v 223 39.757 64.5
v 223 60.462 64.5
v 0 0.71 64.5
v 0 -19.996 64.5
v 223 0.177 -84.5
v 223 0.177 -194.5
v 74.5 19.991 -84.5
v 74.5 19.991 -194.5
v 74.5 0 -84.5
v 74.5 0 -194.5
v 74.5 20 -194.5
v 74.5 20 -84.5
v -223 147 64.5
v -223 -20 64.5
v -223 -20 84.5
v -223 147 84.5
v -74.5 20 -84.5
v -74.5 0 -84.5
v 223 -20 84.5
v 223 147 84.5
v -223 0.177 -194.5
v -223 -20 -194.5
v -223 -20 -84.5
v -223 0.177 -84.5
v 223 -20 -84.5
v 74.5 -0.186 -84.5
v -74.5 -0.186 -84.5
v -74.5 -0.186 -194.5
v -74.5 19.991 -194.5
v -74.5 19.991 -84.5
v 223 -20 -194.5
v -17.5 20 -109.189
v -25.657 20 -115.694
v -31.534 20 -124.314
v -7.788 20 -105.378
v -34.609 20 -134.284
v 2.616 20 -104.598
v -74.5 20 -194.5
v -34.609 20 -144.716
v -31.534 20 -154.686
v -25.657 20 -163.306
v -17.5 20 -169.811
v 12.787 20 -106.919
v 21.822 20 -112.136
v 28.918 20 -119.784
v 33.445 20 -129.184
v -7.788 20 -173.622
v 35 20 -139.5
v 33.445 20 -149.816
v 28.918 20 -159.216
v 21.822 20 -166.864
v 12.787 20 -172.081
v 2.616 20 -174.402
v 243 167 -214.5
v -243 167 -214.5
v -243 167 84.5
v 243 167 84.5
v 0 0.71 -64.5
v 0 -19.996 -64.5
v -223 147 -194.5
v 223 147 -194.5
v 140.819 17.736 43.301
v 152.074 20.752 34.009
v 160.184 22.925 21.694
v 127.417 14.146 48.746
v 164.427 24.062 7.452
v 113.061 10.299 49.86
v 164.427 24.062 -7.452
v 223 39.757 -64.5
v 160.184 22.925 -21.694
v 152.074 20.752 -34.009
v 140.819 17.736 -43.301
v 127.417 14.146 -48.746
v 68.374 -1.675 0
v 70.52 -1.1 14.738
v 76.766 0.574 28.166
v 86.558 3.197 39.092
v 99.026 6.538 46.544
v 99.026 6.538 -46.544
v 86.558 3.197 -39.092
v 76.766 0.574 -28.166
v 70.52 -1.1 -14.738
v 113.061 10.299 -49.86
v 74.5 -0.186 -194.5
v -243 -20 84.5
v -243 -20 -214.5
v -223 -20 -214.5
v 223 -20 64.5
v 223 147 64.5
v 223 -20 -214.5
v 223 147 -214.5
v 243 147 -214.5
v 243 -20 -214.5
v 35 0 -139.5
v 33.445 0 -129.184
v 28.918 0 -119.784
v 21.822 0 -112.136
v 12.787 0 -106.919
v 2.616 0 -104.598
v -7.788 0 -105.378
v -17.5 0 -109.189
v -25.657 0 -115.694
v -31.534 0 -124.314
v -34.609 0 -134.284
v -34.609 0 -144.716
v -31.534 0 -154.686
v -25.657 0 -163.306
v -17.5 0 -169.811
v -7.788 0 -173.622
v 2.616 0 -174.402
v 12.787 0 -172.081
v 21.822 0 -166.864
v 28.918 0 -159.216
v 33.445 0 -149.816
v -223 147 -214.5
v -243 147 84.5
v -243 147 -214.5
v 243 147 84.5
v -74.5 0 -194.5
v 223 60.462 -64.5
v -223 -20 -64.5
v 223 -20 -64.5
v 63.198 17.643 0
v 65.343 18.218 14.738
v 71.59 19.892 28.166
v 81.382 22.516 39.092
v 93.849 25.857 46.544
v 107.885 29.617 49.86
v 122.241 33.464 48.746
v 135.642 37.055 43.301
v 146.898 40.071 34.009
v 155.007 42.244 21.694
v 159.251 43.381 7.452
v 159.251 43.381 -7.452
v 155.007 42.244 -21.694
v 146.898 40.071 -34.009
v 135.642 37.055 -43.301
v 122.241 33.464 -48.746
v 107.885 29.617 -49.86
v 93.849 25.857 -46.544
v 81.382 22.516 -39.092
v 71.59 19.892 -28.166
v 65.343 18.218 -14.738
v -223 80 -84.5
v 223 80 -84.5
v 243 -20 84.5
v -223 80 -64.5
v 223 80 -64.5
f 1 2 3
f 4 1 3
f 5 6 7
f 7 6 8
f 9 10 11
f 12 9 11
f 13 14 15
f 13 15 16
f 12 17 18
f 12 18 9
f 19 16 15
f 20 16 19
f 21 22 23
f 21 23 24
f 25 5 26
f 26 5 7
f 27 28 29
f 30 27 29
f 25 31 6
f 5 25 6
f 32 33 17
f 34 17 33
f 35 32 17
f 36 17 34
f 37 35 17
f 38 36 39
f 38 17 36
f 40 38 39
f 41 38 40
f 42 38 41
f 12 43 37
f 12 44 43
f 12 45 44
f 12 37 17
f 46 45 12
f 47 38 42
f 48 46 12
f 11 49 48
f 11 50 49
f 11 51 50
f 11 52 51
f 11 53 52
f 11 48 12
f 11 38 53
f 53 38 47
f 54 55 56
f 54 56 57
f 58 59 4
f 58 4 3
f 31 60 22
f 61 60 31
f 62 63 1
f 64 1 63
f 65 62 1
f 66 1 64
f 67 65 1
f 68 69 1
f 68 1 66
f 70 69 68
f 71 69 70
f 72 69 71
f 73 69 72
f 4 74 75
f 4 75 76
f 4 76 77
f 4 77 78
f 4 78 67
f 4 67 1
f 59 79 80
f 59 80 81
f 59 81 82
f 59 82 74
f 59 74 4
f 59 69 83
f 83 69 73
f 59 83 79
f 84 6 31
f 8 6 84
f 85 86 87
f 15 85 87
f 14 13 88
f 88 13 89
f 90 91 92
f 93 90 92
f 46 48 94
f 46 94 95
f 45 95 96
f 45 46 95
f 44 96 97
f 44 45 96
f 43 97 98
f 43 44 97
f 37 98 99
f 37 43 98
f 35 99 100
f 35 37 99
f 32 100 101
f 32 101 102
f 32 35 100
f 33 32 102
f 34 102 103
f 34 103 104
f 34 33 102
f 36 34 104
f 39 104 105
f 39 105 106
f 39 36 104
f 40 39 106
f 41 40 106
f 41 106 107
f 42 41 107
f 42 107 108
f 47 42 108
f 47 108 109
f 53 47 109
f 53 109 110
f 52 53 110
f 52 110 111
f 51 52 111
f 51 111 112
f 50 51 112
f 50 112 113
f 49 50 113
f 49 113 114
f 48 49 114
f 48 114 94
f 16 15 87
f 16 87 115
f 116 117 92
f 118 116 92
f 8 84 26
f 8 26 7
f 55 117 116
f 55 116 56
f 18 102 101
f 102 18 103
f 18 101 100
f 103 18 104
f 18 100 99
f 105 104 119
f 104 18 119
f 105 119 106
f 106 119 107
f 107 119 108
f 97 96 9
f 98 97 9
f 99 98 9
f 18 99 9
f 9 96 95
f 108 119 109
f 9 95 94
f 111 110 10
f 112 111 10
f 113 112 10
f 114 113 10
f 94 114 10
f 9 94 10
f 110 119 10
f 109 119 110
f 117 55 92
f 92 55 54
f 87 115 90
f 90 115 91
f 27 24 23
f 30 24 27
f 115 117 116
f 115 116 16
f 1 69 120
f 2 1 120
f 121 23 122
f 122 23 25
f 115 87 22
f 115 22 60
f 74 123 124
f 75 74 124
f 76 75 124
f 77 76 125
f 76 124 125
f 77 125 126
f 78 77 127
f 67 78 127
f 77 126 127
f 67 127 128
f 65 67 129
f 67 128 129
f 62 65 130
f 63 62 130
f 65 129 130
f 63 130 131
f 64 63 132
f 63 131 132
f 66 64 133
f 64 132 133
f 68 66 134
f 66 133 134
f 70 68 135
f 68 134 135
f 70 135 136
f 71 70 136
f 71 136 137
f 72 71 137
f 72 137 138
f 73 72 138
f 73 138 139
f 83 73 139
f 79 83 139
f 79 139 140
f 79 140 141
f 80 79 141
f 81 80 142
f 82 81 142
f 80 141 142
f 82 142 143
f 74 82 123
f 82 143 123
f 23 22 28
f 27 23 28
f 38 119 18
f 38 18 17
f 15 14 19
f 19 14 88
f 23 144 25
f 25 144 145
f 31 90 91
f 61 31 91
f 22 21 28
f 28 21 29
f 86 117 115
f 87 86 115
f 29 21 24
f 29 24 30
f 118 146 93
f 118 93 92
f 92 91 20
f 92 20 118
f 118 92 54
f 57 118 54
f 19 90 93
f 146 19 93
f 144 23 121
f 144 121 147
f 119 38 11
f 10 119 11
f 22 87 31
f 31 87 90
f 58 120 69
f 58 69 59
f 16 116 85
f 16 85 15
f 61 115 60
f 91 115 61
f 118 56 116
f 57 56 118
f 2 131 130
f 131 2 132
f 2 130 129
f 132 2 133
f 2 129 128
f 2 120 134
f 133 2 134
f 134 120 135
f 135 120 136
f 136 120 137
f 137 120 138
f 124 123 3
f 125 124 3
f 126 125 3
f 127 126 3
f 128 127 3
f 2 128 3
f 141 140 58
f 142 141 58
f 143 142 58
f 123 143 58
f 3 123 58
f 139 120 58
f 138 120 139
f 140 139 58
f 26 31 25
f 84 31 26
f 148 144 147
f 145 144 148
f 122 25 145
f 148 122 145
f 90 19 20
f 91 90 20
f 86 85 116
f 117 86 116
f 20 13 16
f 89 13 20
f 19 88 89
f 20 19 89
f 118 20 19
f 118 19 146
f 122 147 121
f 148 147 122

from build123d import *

# Parameters (mm, degrees)
BOX_W                  = 20
BOX_H                  = 167
BOX_DEPTH              = 299
BOX001_W               = 20
BOX001_H               = 167
BOX001_DEPTH           = 299
BOX002_W               = 446
BOX002_H               = 167
BOX002_DEPTH           = 20
BOX003_W               = 486
BOX003_H               = 20
BOX003_DEPTH           = 299
BOX004_W               = 446
BOX004_H               = 167
BOX004_DEPTH           = 20
BOX006_W               = 446
BOX006_H               = 100
BOX006_DEPTH           = 20
CYLINDER_R             = 35
CYLINDER_DEPTH         = 115
CYLINDER_ROLL_ANGLE    = 90
BOX005_W               = 149
BOX005_H               = 20
BOX005_DEPTH           = 110
BOX008_W               = 10
BOX008_H               = 23
BOX008_DEPTH           = 110
BOX009_W               = 20
BOX009_H               = 21
BOX009_DEPTH           = 110
BOX007_W               = 153
BOX007_H               = 20
BOX007_DEPTH           = 110
BOX007_PLACEMENT_ANGLE = 7.6
BOX012_W               = 10
BOX012_H               = 23
BOX012_DEPTH           = 110
BOX011_W               = 20
BOX011_H               = 21
BOX011_DEPTH           = 110
BOX010_W               = 153
BOX010_H               = 20
BOX010_DEPTH           = 110
BOX010_PLACEMENT_ANGLE = 7.6
BOX016_W               = 7
BOX016_H               = 23
BOX016_DEPTH           = 129
BOX014_W               = 10
BOX014_H               = 30
BOX014_DEPTH           = 129
CYLINDER001_R          = 50
CYLINDER001_DEPTH      = 20
CYLINDER001_ROLL_ANGLE = 90
BOX017_W               = 237
BOX017_H               = 20
BOX017_DEPTH           = 129
CUT005_PLACEMENT_ANGLE = -15


with BuildPart() as face_gauche:
    # Box → Box (new body)
    with BuildSketch(Plane(origin=(-243, -20, -214.5), x_dir=(1, 0, 0), z_dir=(0, 0, 1))):
        with Locations((10, 83.5)):
            Rectangle(BOX_W, BOX_H)
    extrude(amount=BOX_DEPTH)


with BuildPart() as face_droite:
    # Box001 → Box001 (new body)
    with BuildSketch(Plane(origin=(223, -20, -214.5), x_dir=(1, 0, 0), z_dir=(0, 0, 1))):
        with Locations((10, 83.5)):
            Rectangle(BOX001_W, BOX001_H)
    extrude(amount=BOX001_DEPTH)


with BuildPart() as face_haute:
    # Box002 → Box002 (new body)
    with BuildSketch(Plane(origin=(-223, -20, 64.5), x_dir=(1, 0, 0), z_dir=(0, 0, 1))):
        with Locations((223, 83.5)):
            Rectangle(BOX002_W, BOX002_H)
    extrude(amount=BOX002_DEPTH)


with BuildPart() as face_fond:
    # Box003 → Box003 (new body)
    with BuildSketch(Plane(origin=(-243, 147, -214.5), x_dir=(1, 0, 0), z_dir=(0, 0, 1))):
        with Locations((243, 10)):
            Rectangle(BOX003_W, BOX003_H)
    extrude(amount=BOX003_DEPTH)


with BuildPart() as face_basse:
    # Box004 → Box004 (new body)
    with BuildSketch(Plane(origin=(-223, -20, -214.5), x_dir=(1, 0, 0), z_dir=(0, 0, 1))):
        with Locations((223, 83.5)):
            Rectangle(BOX004_W, BOX004_H)
    extrude(amount=BOX004_DEPTH)


with BuildPart() as face_interm_diaire:
    # Box006 → Box006 (new body)
    with BuildSketch(Plane(origin=(-223, -20, -84.5), x_dir=(1, 0, 0), z_dir=(0, 0, 1))):
        with Locations((223, 50)):
            Rectangle(BOX006_W, BOX006_H)
    extrude(amount=BOX006_DEPTH)


with BuildPart() as bass_reflex:
    # Cylinder → Cylinder (new body)
    with BuildSketch(Plane.XY):
        Circle(CYLINDER_R)
    extrude(amount=CYLINDER_DEPTH)


with BuildPart() as bass_reflex_1:
    # Cylinder roll: moved
    add(bass_reflex.part.rotate(Axis((0, 0, 0), (1, 0, 0)), CYLINDER_ROLL_ANGLE))


with BuildPart() as bass_reflex_2:
    # Cylinder placement: moved
    add(bass_reflex_1.part.moved(Location((0, 115, -139.5))))


with BuildPart() as avant_bass_reflex:
    # Box005 → Box005 (new body)
    with BuildSketch(Plane(origin=(-74.5, 0, -194.5), x_dir=(1, 0, 0), z_dir=(0, 0, 1))):
        with Locations((74.5, 10)):
            Rectangle(BOX005_W, BOX005_H)
    extrude(amount=BOX005_DEPTH)

    # Cut: cut Bass Reflex
    add(bass_reflex_2.part, mode=Mode.SUBTRACT)


with BuildPart() as coupe1:
    # Box008 → Box008 (new body)
    with BuildSketch(Plane(origin=(-74.5, -1, -194.5), x_dir=(1, 0, 0), z_dir=(0, 0, 1))):
        with Locations((5, 11.5)):
            Rectangle(BOX008_W, BOX008_H)
    extrude(amount=BOX008_DEPTH)


with BuildPart() as coupe2:
    # Box009 → Box009 (new body)
    with BuildSketch(Plane(origin=(-243, -20, -194.5), x_dir=(1, 0, 0), z_dir=(0, 0, 1))):
        with Locations((10, 10.5)):
            Rectangle(BOX009_W, BOX009_H)
    extrude(amount=BOX009_DEPTH)


with BuildPart() as coupe_avant_gauche:
    # Box007 → Box007 (new body)
    with BuildSketch(Plane.XY):
        with Locations((76.5, 10)):
            Rectangle(BOX007_W, BOX007_H)
    extrude(amount=BOX007_DEPTH)


with BuildPart() as coupe_avant_gauche_1:
    # Box007 placement: moved
    add(coupe_avant_gauche.part.moved(Location((-223, -20, -194.5))).rotate(Axis((-223, -20, -194.5), (0, 0, 1)), BOX007_PLACEMENT_ANGLE))

    # Cut001: cut Coupe2
    add(coupe2.part, mode=Mode.SUBTRACT)

    # Cut002: cut Coupe1
    add(coupe1.part, mode=Mode.SUBTRACT)


with BuildPart() as coupe004:
    # Box012 → Box012 (new body)
    with BuildSketch(Plane(origin=(-74.5, -1, -194.5), x_dir=(1, 0, 0), z_dir=(0, 0, 1))):
        with Locations((5, 11.5)):
            Rectangle(BOX012_W, BOX012_H)
    extrude(amount=BOX012_DEPTH)


with BuildPart() as coupe003:
    # Box011 → Box011 (new body)
    with BuildSketch(Plane(origin=(-243, -20, -194.5), x_dir=(1, 0, 0), z_dir=(0, 0, 1))):
        with Locations((10, 10.5)):
            Rectangle(BOX011_W, BOX011_H)
    extrude(amount=BOX011_DEPTH)


with BuildPart() as coupe_avant_droit:
    # Box010 → Box010 (new body)
    with BuildSketch(Plane.XY):
        with Locations((76.5, 10)):
            Rectangle(BOX010_W, BOX010_H)
    extrude(amount=BOX010_DEPTH)


with BuildPart() as coupe_avant_droit_1:
    # Box010 placement: moved
    add(coupe_avant_droit.part.moved(Location((-223, -20, -194.5))).rotate(Axis((-223, -20, -194.5), (0, 0, 1)), BOX010_PLACEMENT_ANGLE))

    # Cut004: cut Coupe003
    add(coupe003.part, mode=Mode.SUBTRACT)

    # Cut003: cut Coupe004
    add(coupe004.part, mode=Mode.SUBTRACT)


with BuildPart() as coupe_avant_droit001:
    # Part__Mirroring: instance of Coupe avant droit
    add(coupe_avant_droit_1.part.mirror(Plane(origin=(0, 0, 0), x_dir=(0, -1, 0), z_dir=(1, 0, 0))))


with BuildPart() as cube003:
    # Box016 → Box016 (new body)
    with BuildSketch(Plane(origin=(-230, 39, -64.5), x_dir=(1, 0, 0), z_dir=(0, 0, 1))):
        with Locations((3.5, 11.5)):
            Rectangle(BOX016_W, BOX016_H)
    extrude(amount=BOX016_DEPTH)


with BuildPart() as cube001:
    # Box014 → Box014 (new body)
    with BuildSketch(Plane(origin=(0, -21, -64.5), x_dir=(1, 0, 0), z_dir=(0, 0, 1))):
        with Locations((5, 15)):
            Rectangle(BOX014_W, BOX014_H)
    extrude(amount=BOX014_DEPTH)


with BuildPart() as cylindre:
    # Cylinder001 → Cylinder001 (new body)
    with BuildSketch(Plane.XY):
        Circle(CYLINDER001_R)
    extrude(amount=CYLINDER001_DEPTH)


with BuildPart() as cylindre_1:
    # Cylinder001 roll: moved
    add(cylindre.part.rotate(Axis((0, 0, 0), (1, 0, 0)), CYLINDER001_ROLL_ANGLE))


with BuildPart() as cylindre_2:
    # Cylinder001 placement: moved
    add(cylindre_1.part.moved(Location((5, 20, 0))))


with BuildPart() as hp_gauche:
    # Box017 → Box017 (new body)
    with BuildSketch(Plane(origin=(-110.5, 0, -64.5), x_dir=(1, 0, 0), z_dir=(0, 0, 1))):
        with Locations((118.5, 10)):
            Rectangle(BOX017_W, BOX017_H)
    extrude(amount=BOX017_DEPTH)

    # Cut005: cut Cylindre
    add(cylindre_2.part, mode=Mode.SUBTRACT)


with BuildPart() as hp_gauche_1:
    # Cut005 placement: moved
    add(hp_gauche.part.moved(Location((-121.5, 12.56, 0))).rotate(Axis((-121.5, 12.56, 0), (0, 0, 1)), CUT005_PLACEMENT_ANGLE))

    # Cut006: cut Cube001
    add(cube001.part, mode=Mode.SUBTRACT)

    # Cut007: cut Cube003
    add(cube003.part, mode=Mode.SUBTRACT)


with BuildPart() as hp_droit:
    # Part__Mirroring001: instance of HP Gauche
    add(hp_gauche_1.part.mirror(Plane(origin=(0, 0, 0), x_dir=(0, -1, 0), z_dir=(1, 0, 0))))


solid = Compound([face_gauche.part, face_droite.part, face_haute.part, face_fond.part, face_basse.part, face_interm_diaire.part, avant_bass_reflex.part, coupe_avant_gauche_1.part, coupe_avant_droit001.part, hp_droit.part])
